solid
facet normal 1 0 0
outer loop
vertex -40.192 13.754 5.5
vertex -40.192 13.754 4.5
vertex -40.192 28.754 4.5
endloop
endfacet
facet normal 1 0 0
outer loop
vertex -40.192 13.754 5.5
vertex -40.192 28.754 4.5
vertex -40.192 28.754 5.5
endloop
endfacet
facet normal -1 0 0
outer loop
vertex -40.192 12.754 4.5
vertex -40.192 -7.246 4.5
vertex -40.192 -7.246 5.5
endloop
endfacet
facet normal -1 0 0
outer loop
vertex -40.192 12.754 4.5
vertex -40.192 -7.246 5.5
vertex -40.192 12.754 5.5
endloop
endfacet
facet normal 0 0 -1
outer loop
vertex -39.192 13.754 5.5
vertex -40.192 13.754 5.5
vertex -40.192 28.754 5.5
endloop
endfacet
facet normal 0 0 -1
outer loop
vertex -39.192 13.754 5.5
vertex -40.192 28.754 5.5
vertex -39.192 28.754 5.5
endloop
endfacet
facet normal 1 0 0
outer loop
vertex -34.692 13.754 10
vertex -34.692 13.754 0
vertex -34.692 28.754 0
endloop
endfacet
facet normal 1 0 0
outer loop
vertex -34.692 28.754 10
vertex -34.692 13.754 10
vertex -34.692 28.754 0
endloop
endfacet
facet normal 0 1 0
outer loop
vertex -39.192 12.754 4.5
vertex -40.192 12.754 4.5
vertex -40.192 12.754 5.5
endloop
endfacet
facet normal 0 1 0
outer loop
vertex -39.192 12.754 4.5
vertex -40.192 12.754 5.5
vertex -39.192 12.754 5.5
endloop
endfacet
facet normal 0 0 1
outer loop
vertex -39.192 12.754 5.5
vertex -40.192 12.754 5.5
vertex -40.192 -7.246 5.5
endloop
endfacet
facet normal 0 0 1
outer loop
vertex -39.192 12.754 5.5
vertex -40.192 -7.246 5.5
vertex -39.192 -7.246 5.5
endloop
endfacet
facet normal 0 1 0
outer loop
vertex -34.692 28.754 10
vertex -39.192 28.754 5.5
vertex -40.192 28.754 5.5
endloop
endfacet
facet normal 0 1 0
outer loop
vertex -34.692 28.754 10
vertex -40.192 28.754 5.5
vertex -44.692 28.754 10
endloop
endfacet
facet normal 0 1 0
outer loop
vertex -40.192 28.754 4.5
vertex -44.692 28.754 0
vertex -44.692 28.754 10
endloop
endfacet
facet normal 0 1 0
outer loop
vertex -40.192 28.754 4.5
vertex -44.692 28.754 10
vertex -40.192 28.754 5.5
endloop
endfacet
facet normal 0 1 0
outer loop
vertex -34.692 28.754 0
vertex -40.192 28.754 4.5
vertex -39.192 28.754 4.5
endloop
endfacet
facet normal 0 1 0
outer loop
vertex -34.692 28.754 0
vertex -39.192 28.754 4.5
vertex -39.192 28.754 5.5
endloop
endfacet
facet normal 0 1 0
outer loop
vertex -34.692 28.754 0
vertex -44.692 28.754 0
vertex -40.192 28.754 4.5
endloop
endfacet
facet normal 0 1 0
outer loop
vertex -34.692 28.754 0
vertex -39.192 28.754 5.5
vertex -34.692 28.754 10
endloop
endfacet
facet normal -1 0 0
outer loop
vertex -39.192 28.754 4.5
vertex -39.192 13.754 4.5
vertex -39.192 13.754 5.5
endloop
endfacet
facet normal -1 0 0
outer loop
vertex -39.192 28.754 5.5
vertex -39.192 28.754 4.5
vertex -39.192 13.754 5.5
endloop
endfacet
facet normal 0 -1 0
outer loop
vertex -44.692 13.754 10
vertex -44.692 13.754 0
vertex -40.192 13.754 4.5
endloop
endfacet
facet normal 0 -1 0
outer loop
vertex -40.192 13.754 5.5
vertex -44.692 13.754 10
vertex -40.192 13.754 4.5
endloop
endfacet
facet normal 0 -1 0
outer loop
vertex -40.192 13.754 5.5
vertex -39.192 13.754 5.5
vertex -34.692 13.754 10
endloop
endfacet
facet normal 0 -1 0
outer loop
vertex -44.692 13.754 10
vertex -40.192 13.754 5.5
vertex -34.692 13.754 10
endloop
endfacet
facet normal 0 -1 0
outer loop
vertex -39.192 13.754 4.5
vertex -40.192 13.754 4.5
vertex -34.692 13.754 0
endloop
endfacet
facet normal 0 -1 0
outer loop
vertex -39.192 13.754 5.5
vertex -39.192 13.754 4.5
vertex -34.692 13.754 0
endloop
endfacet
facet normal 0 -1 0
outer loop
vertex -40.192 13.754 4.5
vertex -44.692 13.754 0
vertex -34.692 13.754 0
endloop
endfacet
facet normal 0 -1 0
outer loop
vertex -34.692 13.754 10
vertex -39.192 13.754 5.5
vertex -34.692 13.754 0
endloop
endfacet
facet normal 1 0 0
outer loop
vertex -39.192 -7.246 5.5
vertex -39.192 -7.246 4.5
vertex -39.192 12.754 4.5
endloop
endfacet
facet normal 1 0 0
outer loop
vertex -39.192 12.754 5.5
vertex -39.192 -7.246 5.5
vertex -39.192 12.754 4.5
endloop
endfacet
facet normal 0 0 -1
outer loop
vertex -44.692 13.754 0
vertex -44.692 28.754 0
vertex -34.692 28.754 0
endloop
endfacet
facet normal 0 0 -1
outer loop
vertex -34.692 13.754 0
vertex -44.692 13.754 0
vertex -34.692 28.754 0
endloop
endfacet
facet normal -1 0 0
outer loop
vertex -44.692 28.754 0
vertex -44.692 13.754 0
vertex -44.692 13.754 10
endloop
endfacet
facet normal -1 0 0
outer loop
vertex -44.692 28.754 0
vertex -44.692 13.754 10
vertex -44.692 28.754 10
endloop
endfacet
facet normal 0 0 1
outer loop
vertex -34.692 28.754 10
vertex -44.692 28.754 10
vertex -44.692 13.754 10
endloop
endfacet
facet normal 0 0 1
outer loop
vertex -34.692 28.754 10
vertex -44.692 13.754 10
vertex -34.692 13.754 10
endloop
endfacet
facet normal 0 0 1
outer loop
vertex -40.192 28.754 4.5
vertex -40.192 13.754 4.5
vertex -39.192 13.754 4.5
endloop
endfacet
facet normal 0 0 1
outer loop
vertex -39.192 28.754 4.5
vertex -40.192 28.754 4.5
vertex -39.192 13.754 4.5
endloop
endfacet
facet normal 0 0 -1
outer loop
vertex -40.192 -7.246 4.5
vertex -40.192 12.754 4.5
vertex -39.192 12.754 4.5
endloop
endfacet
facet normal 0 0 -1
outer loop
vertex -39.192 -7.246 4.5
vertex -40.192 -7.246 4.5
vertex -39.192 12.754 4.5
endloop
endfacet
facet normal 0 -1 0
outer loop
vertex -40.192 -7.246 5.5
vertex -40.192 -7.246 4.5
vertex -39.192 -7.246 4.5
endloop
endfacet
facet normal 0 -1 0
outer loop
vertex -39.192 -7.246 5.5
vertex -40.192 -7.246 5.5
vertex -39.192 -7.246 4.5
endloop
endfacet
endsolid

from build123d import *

# Parameters (mm, degrees)
F0_W     = 1
F0_H     = 20
F1_DEPTH = 1
F0_W_2   = 10
F0_H_2   = 15
F2_DEPTH = 10
F3_W     = 1
F3_H     = 1
F4_DEPTH = 25


with BuildPart() as f1:
    # F0 (on Top) → F1 (new body)
    with BuildSketch(Plane.XY):
        with Locations((-39.691859, 2.754338)):
            Rectangle(F0_W, F0_H)
    extrude(amount=F1_DEPTH)


with BuildPart() as f2:
    # F0 (on Top) → F2 (new body)
    with BuildSketch(Plane.XY):
        with Locations((-39.691859, 21.254338)):
            Rectangle(F0_W_2, F0_H_2)
    extrude(amount=F2_DEPTH)

    # F3 (on face) → F4 (cut)
    with BuildSketch(Plane.XZ.offset(-13.754338)):
        with Locations((-39.691859, 5)):
            Rectangle(F3_W, F3_H)
    extrude(amount=-F4_DEPTH, mode=Mode.SUBTRACT)


with BuildPart() as f1_1:
    # F5: moved
    add(f1.part.moved(Location((0, 0, 4.5))))


solid = Compound([f2.part, f1_1.part])
